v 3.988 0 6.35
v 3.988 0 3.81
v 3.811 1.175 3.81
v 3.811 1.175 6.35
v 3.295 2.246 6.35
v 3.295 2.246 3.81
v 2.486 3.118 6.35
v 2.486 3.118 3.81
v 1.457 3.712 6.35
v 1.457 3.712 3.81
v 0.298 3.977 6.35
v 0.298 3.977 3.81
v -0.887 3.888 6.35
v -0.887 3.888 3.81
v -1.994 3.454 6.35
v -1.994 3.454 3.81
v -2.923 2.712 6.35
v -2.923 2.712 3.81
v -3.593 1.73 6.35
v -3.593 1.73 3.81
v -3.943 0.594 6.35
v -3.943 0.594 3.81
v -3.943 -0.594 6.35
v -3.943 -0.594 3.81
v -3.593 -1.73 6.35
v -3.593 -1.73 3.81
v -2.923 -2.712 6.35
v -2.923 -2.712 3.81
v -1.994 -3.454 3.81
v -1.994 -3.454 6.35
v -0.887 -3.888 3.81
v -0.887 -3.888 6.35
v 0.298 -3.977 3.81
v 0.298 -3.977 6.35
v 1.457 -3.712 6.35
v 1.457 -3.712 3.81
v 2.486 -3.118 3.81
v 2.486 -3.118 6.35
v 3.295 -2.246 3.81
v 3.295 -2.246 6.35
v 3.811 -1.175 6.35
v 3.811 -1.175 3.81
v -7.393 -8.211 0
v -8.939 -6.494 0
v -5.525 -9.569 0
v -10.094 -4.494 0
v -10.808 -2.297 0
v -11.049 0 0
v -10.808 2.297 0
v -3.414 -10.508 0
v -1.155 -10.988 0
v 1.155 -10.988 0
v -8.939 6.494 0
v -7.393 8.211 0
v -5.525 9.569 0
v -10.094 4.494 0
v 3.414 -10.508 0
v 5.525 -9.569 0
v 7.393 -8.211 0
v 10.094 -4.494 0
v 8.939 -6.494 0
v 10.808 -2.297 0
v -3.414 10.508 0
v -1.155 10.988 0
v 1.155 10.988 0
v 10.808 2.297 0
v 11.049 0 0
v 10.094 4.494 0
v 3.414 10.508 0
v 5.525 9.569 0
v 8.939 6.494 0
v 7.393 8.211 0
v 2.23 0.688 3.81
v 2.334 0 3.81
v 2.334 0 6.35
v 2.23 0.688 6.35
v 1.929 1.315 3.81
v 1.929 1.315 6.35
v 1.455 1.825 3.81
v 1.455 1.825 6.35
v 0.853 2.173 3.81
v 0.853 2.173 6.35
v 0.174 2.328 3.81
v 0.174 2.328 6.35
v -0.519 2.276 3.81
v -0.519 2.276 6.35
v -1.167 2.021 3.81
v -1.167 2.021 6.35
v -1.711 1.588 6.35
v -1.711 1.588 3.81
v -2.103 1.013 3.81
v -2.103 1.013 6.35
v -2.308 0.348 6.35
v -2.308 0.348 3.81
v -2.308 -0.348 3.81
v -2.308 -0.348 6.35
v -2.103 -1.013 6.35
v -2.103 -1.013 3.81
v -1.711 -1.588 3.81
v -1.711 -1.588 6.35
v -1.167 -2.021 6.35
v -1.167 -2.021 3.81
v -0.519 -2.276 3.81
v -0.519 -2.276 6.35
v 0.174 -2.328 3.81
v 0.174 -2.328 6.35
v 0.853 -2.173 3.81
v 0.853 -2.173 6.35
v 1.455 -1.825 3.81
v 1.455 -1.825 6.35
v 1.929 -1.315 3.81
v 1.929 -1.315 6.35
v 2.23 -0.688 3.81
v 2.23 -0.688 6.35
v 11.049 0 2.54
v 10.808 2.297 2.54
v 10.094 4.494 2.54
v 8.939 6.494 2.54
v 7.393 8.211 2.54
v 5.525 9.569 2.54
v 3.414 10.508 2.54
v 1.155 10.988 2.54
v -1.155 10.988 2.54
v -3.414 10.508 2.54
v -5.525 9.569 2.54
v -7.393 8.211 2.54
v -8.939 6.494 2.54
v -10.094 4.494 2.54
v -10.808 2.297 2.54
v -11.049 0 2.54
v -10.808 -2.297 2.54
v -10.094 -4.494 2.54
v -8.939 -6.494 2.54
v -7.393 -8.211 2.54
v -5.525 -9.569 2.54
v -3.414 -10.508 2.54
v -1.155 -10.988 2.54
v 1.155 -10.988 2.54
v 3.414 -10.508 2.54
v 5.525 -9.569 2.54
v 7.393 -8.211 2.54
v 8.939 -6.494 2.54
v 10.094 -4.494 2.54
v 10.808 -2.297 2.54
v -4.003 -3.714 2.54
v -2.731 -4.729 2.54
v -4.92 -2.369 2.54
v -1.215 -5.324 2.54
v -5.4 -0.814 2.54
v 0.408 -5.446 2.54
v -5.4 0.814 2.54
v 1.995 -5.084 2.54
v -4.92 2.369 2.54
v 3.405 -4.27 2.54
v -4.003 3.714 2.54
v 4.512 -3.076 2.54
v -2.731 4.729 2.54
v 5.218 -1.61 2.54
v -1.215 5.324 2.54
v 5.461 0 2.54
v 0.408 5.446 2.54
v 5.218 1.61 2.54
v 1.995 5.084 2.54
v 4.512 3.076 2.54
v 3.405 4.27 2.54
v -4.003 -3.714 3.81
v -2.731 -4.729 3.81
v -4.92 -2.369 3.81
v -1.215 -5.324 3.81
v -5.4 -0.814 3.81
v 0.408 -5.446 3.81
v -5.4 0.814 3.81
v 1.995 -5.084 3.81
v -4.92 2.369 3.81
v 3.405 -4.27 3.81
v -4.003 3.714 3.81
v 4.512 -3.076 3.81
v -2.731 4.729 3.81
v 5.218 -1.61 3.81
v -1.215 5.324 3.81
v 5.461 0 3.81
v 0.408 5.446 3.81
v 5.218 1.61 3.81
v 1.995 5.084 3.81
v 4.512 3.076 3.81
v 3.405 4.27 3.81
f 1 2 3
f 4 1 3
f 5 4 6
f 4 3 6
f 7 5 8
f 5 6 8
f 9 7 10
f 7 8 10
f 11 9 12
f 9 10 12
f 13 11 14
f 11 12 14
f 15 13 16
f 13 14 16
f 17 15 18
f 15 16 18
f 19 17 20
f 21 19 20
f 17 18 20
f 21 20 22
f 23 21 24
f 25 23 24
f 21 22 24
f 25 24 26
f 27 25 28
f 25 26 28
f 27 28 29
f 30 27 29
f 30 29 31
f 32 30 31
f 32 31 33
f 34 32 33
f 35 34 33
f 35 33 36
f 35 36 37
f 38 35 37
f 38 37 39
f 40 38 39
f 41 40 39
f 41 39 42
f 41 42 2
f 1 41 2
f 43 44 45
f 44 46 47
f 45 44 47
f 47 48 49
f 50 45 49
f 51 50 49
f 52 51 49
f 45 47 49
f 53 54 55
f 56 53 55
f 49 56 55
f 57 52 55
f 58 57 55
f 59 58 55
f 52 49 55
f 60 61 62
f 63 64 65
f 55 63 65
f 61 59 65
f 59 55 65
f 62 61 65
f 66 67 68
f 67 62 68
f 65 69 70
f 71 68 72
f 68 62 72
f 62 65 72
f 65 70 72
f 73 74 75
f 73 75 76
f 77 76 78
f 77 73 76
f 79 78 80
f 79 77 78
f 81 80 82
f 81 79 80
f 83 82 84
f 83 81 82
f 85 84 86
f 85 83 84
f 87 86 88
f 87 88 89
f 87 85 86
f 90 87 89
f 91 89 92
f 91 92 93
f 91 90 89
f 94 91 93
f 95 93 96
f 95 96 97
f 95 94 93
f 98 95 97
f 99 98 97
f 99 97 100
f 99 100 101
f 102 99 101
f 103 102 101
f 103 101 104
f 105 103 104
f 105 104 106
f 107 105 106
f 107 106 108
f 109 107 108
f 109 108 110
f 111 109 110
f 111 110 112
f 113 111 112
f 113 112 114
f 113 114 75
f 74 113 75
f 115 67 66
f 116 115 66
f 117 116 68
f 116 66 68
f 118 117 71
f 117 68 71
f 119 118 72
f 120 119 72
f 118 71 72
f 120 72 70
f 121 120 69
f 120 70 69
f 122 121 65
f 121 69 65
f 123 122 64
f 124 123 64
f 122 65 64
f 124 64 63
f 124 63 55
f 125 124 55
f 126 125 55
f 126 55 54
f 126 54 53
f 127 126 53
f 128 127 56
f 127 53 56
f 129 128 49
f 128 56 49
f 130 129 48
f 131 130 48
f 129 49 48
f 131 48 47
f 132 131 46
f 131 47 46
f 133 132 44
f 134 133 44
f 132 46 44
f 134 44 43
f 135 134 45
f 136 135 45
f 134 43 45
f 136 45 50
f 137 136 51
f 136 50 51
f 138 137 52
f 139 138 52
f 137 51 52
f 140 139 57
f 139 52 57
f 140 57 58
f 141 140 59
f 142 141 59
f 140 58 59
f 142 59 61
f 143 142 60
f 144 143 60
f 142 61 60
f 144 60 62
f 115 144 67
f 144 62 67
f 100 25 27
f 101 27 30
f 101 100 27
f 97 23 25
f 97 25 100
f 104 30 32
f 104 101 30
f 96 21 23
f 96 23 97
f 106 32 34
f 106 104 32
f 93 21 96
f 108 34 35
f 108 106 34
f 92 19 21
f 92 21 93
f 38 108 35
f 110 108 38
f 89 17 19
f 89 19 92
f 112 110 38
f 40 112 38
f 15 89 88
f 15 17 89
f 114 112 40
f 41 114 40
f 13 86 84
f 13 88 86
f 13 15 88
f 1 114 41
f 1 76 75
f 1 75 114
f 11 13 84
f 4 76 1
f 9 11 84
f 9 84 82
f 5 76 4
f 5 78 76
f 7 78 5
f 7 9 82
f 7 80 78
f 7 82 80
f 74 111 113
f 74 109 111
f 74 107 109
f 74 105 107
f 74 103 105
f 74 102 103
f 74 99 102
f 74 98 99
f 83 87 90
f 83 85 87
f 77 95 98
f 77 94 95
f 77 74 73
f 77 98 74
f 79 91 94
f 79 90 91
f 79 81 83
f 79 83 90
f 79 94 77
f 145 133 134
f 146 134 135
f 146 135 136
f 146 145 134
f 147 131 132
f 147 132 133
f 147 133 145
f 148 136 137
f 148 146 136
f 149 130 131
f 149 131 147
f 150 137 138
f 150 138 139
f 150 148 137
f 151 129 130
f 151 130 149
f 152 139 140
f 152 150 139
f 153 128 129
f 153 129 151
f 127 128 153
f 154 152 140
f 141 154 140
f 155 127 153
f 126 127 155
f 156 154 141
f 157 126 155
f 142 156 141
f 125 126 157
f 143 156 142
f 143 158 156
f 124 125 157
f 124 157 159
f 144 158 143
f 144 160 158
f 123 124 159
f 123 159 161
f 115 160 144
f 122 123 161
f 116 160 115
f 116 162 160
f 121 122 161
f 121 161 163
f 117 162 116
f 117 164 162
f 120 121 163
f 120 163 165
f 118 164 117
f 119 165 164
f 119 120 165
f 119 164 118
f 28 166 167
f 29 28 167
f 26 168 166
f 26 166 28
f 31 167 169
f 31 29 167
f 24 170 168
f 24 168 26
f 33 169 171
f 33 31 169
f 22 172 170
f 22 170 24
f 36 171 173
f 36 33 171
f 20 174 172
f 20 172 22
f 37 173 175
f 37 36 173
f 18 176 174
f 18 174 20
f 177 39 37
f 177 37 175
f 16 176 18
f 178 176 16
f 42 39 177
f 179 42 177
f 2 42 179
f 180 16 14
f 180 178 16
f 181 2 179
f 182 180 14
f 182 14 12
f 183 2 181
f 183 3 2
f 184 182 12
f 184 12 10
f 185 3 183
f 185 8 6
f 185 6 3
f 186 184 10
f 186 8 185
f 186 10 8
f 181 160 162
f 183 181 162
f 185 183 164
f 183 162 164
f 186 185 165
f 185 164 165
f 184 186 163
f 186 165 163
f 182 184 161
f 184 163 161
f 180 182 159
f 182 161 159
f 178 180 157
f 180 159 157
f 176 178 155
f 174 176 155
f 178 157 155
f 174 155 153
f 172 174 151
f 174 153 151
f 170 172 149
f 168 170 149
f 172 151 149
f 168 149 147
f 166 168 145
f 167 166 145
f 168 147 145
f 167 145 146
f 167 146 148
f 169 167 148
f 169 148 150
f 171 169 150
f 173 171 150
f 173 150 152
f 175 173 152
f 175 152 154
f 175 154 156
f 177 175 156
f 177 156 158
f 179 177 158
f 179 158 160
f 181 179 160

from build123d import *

# Parameters (mm, degrees)
F0_R     = 11.049
F1_DEPTH = 2.54
F2_R     = 5.461
F3_DEPTH = 3.81
F4_R     = 3.9878
F4_R_2   = 2.334094
F5_DEPTH = 6.35


with BuildPart() as f1:
    # F0 (on Top) → F1 (new body)
    with BuildSketch(Plane.XY):
        Circle(F0_R)
    extrude(amount=F1_DEPTH)

    # F2 (on Top) → F3 (join)
    with BuildSketch(Plane.XY):
        Circle(F2_R)
    extrude(amount=F3_DEPTH)

    # F4 (on Top) → F5 (join)
    with BuildSketch(Plane.XY):
        Circle(F4_R)
        Circle(F4_R_2, mode=Mode.SUBTRACT)
    extrude(amount=F5_DEPTH)


solid = f1.part
